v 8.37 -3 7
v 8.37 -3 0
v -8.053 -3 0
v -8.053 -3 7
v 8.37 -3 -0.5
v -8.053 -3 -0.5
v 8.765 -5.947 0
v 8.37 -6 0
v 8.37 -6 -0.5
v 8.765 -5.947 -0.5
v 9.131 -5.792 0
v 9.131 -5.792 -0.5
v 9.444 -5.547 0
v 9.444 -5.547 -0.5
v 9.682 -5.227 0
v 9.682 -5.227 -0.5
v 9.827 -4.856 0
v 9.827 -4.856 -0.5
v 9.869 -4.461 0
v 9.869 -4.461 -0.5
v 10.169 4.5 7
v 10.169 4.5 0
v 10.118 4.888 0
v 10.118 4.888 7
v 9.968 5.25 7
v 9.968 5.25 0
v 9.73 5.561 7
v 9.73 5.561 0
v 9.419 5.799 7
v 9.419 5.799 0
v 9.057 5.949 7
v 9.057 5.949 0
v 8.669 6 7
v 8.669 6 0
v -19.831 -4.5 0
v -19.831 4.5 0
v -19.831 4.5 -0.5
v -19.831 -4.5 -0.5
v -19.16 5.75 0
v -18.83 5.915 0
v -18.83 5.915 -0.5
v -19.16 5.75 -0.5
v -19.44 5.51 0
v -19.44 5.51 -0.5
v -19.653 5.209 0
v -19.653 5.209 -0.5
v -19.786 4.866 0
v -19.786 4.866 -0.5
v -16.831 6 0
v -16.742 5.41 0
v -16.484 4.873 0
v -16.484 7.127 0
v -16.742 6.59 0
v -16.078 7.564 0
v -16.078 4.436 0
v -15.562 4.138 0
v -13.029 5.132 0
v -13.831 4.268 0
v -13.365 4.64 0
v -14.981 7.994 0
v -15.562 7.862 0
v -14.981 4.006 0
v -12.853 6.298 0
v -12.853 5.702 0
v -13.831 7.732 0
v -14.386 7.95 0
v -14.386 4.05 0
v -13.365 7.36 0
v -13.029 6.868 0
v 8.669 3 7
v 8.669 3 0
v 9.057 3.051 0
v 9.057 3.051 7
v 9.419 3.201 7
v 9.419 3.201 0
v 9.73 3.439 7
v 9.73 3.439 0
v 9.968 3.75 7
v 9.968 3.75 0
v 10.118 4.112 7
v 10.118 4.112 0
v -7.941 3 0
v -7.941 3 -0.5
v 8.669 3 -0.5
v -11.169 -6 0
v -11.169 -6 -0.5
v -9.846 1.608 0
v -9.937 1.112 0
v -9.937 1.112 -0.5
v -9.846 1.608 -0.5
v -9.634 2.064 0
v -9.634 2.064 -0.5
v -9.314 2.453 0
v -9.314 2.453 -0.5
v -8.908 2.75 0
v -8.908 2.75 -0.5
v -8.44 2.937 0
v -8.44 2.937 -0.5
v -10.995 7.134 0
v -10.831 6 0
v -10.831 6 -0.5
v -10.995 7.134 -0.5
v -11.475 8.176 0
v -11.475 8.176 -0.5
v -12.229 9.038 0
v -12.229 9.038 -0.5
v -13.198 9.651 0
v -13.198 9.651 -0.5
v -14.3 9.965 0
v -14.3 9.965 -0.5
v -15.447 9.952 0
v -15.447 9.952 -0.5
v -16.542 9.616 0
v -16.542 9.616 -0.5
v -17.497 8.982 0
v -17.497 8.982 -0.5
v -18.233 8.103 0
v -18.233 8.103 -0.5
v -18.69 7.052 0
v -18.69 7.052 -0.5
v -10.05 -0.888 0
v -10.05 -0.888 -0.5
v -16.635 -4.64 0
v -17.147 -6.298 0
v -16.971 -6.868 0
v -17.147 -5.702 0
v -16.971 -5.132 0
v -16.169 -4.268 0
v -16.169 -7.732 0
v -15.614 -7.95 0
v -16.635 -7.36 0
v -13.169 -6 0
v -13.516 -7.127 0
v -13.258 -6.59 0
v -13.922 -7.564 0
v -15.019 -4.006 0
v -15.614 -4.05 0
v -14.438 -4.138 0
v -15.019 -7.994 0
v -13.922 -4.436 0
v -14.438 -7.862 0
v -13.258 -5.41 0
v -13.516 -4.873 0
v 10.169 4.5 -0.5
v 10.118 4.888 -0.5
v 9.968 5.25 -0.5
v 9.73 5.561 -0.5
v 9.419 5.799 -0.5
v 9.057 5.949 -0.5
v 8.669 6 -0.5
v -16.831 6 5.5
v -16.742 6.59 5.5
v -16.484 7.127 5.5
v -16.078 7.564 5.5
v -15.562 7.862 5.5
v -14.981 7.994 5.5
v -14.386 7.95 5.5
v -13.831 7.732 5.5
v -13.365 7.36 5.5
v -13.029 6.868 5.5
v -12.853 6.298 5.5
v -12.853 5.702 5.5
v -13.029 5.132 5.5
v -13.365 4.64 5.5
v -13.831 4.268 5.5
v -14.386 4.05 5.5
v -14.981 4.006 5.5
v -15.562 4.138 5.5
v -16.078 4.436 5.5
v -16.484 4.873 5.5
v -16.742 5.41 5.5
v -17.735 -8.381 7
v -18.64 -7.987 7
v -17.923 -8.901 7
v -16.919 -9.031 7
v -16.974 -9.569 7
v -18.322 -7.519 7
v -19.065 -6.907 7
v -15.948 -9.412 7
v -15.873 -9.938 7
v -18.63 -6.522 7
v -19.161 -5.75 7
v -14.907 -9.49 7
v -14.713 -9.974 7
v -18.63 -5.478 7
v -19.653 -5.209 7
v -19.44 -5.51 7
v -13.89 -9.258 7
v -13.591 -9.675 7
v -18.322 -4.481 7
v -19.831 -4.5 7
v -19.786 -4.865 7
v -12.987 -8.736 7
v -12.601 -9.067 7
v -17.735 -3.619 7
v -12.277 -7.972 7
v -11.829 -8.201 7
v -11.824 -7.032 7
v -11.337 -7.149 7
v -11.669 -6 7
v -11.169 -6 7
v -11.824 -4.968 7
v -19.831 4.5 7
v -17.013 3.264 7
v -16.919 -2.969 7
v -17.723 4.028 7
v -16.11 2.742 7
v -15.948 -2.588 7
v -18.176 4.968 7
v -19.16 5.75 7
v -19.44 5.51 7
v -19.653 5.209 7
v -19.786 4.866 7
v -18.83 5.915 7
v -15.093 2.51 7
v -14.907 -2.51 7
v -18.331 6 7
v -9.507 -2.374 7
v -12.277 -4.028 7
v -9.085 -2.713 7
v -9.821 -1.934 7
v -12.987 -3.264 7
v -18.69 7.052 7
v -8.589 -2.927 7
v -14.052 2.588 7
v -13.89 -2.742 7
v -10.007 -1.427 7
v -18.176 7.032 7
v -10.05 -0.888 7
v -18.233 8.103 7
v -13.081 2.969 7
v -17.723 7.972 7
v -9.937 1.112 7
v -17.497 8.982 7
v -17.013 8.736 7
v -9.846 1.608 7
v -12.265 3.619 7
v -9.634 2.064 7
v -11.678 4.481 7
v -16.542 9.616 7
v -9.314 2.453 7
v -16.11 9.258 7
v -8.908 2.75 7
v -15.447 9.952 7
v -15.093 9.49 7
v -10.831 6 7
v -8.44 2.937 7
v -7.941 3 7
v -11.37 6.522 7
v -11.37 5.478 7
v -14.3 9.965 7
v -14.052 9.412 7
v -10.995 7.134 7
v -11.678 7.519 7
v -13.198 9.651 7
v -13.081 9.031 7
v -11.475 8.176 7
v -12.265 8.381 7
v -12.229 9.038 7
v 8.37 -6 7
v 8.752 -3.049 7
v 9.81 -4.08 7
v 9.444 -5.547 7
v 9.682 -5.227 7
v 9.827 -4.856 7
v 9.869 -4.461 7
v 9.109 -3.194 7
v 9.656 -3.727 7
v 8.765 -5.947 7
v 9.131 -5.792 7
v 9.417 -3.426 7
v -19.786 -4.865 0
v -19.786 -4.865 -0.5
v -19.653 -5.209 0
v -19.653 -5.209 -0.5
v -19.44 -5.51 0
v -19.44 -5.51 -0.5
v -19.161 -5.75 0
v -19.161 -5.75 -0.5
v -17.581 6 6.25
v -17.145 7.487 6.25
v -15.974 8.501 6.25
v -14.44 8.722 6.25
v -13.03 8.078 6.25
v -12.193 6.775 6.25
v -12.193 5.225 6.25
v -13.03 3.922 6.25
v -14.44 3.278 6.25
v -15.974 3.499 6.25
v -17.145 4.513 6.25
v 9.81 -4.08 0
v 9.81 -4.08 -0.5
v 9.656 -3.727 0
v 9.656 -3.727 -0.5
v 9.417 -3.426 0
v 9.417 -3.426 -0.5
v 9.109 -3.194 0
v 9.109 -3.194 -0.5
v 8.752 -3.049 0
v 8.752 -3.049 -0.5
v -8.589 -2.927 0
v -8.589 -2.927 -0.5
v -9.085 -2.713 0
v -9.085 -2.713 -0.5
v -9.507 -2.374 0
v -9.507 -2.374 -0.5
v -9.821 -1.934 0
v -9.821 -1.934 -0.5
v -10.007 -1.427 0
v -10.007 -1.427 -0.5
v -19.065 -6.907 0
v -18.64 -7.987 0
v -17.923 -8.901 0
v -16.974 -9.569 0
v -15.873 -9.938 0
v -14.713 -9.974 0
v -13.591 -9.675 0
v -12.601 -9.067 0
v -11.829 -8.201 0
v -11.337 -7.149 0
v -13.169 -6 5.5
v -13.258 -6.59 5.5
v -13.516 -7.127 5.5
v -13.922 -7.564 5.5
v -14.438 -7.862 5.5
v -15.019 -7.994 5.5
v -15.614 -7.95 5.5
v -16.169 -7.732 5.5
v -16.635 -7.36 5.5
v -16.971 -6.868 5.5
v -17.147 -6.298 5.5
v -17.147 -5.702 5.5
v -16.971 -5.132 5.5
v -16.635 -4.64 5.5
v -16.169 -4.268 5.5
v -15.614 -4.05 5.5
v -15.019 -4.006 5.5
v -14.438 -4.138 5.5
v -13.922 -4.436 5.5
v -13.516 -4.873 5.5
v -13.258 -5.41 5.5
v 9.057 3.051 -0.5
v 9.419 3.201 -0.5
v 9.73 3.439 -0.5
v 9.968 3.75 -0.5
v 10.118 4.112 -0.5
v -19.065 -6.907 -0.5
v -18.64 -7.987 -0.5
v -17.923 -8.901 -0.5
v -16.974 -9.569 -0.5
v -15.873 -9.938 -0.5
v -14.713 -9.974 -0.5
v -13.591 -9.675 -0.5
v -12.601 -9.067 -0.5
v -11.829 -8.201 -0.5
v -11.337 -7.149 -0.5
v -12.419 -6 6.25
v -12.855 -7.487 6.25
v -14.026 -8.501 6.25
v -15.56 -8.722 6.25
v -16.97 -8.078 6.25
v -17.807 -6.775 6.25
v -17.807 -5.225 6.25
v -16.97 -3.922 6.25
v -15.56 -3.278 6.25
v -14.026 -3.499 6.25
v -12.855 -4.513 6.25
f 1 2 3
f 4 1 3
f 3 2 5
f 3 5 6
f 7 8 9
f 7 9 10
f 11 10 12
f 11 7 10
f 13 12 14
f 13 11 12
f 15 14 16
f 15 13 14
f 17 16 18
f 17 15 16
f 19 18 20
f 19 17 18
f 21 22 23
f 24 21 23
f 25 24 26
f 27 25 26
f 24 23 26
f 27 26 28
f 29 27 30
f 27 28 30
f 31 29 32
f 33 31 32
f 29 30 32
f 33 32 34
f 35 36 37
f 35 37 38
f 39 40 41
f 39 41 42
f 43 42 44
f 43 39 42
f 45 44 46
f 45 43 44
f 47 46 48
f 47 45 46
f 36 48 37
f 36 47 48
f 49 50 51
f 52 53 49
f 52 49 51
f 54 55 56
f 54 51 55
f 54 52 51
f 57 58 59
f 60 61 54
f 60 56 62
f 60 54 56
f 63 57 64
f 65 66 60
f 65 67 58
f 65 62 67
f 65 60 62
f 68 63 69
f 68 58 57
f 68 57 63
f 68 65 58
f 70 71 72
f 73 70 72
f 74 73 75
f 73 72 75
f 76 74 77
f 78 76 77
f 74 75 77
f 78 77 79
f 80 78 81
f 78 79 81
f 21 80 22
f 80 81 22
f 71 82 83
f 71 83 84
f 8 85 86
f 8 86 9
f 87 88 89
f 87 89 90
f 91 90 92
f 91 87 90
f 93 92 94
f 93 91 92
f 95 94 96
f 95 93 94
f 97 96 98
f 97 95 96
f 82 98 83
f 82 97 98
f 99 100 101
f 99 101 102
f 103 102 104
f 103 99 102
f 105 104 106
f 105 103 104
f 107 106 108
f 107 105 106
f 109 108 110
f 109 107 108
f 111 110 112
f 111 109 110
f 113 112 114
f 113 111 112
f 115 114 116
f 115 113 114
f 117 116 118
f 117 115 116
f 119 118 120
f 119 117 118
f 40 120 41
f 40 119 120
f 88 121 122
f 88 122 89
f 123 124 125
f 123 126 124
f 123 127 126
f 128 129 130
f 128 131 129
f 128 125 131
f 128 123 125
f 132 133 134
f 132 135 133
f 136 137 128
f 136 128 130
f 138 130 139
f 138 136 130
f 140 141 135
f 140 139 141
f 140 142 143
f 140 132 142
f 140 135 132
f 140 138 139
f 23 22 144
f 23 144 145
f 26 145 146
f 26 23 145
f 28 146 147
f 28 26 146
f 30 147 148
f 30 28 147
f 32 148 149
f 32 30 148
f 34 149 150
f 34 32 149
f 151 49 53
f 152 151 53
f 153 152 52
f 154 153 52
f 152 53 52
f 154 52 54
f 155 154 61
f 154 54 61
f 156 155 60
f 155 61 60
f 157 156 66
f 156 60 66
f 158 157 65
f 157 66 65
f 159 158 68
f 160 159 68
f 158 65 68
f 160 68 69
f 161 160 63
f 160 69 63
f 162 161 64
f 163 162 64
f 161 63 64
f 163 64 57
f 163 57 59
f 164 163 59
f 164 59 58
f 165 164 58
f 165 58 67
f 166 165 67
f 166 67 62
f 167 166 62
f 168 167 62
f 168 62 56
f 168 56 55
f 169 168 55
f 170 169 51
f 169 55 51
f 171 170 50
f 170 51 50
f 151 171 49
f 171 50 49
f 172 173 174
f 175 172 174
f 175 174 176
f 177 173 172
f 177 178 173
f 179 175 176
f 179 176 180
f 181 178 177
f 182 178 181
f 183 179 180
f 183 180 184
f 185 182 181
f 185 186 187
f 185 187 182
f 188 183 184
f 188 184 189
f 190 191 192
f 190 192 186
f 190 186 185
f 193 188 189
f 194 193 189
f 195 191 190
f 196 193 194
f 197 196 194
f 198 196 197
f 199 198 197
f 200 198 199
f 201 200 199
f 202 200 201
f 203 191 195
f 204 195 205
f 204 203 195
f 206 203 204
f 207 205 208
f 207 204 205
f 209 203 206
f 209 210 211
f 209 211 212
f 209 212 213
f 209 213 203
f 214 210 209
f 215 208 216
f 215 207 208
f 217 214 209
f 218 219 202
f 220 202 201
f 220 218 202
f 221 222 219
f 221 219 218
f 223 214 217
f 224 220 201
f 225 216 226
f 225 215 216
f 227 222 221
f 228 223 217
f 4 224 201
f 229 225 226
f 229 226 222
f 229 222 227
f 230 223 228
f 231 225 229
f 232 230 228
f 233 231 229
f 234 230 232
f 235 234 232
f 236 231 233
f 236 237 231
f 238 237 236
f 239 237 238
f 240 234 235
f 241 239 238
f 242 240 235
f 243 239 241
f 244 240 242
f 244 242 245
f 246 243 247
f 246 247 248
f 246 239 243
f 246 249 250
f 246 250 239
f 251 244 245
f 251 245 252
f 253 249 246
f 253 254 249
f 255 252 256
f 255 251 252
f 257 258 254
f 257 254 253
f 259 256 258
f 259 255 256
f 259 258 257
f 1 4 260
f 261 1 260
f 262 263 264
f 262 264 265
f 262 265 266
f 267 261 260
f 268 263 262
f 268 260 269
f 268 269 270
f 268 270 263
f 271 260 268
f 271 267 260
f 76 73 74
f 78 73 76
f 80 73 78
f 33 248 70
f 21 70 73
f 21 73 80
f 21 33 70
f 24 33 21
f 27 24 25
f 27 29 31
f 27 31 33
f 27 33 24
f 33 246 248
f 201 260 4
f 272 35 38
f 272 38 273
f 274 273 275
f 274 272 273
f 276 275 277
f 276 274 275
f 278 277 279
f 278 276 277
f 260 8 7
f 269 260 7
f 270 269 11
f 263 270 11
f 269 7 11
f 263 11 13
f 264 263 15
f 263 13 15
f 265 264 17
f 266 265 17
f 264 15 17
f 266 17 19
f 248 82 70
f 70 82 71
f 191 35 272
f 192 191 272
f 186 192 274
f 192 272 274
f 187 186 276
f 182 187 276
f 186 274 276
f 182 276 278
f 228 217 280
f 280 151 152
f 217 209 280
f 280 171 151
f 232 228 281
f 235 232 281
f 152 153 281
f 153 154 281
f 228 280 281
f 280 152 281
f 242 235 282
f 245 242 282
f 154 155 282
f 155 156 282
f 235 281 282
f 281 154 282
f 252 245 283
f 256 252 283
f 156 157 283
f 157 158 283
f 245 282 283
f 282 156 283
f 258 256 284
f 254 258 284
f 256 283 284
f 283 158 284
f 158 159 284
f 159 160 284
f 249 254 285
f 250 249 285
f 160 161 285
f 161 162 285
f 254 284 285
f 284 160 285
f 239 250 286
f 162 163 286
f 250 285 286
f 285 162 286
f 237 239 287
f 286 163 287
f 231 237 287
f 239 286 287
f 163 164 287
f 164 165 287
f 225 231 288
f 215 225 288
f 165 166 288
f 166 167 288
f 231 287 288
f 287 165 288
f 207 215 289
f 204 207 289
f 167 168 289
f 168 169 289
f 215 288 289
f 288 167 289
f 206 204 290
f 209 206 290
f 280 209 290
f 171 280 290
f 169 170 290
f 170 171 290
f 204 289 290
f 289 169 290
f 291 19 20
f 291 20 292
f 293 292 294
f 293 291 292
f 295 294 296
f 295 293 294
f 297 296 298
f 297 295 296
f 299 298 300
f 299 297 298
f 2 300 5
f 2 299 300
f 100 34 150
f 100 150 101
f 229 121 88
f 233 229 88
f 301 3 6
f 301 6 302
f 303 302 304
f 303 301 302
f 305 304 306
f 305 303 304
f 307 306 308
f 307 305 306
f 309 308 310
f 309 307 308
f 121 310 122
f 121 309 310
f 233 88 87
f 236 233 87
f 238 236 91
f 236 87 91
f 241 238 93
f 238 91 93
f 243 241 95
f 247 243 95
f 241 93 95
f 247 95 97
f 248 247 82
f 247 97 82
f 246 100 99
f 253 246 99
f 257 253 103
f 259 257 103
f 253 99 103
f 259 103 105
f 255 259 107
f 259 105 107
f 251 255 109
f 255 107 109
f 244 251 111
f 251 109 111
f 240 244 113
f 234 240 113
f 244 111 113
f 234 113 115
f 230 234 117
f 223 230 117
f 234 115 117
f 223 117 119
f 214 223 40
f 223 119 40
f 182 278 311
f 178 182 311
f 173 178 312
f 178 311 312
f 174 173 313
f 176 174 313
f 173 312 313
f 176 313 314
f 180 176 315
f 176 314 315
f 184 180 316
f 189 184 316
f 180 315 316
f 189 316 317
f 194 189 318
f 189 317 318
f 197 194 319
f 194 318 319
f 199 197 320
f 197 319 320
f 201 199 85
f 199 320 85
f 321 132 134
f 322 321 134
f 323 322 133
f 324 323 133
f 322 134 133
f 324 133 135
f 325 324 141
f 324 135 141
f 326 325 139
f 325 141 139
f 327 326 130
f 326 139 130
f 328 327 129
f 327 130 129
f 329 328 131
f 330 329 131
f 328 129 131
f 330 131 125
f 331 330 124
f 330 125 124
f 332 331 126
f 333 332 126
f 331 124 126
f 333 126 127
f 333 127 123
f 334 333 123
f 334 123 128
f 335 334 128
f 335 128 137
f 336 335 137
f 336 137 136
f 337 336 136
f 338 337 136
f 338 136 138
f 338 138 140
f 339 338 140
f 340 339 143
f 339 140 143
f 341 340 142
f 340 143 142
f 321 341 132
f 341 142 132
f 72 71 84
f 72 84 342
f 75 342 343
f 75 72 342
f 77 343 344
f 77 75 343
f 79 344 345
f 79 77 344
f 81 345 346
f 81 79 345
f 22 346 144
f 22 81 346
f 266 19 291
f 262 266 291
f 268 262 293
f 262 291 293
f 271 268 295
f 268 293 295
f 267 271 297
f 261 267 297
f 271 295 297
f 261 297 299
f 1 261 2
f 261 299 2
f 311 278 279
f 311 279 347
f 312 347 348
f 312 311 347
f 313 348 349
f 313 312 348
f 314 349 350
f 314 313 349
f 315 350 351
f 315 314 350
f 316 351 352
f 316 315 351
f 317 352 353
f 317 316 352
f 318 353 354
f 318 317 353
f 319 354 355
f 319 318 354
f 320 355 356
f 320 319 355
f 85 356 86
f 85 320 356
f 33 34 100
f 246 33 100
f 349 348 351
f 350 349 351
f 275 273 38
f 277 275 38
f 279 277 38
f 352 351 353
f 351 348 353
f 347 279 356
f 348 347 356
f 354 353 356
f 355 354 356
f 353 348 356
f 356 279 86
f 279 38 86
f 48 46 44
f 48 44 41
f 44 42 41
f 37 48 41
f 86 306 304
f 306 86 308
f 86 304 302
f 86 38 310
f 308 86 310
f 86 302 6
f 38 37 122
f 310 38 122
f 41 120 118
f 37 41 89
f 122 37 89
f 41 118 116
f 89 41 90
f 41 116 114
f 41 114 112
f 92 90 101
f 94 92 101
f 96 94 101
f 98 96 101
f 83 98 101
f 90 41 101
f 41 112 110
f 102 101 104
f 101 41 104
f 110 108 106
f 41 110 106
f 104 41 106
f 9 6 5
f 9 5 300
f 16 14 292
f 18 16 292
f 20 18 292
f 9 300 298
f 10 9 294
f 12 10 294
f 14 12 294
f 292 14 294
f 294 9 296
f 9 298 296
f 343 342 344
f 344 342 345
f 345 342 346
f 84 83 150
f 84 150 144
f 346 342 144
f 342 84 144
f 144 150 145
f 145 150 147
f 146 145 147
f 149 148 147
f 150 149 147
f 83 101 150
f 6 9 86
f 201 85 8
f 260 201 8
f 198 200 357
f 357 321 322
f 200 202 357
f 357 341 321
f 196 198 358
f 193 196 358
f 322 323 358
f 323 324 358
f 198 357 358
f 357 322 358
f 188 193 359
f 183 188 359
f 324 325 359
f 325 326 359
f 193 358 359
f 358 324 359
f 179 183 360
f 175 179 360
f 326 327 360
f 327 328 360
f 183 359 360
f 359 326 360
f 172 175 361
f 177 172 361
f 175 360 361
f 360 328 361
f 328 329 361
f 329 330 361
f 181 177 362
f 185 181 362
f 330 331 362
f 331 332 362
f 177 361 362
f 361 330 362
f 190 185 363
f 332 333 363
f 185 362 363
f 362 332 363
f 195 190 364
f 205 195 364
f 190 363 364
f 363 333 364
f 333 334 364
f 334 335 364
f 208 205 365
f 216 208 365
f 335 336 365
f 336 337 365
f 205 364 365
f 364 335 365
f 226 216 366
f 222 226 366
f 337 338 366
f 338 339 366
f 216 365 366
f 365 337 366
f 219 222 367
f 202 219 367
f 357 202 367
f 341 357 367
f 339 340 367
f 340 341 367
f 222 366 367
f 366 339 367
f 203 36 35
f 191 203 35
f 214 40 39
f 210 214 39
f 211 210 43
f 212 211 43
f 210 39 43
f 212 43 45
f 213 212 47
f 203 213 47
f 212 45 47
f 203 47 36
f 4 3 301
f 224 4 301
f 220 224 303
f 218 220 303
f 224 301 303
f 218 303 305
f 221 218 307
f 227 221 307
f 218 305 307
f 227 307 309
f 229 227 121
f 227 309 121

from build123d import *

# Parameters (mm, degrees)
F1_DEPTH = 7
F2_DEPTH = 0.5
F3_SIZE  = 1.5


with BuildPart() as f1:
    # F0 (on Top) → F1 (new body)
    with BuildSketch(Plane.XY):
        with BuildLine():
            ThreePointArc((9.8694702636, -4.4606494482), (9.4166416974, -3.4255173739), (8.3699865077, -3))
            Line((8.3699865077, -3), (-8.0531213294, -3))
            ThreePointArc((-8.0531213294, -3), (-9.5065298079, -2.3739009406), (-10.0499606051, -0.8876037946))
            Line((-10.0499606051, -0.8876037946), (-9.9373864918, 1.1123962054))
            ThreePointArc((-9.9373864918, 1.1123962054), (-9.3144481567, 2.4534084785), (-7.9405472161, 3))
            Line((-7.9405472161, 3), (8.6688611699, 3))
            ThreePointArc((8.6688611699, 3), (9.7295213417, 3.4393398282), (10.1688611699, 4.5))
            ThreePointArc((10.1688611699, 4.5), (9.7295213417, 5.5606601718), (8.6688611699, 6))
            Line((8.6688611699, 6), (-10.8311388301, 6))
            ThreePointArc((-10.8311388301, 6), (-14.788404424, 2.0002282852), (-18.8302257154, 5.9145360656))
            ThreePointArc((-18.8302257154, 5.9145360656), (-19.5556040864, 5.3664207038), (-19.8311388301, 4.5))
            Line((-19.8311388301, 4.5), (-19.8311388301, -4.5))
            ThreePointArc((-19.8311388301, -4.5), (-19.6530330387, -5.2089398432), (-19.1610112284, -5.7495246306))
            ThreePointArc((-19.1610112284, -5.7495246306), (-15.0435619957, -2.001962967), (-11.1688611699, -6))
            Line((-11.1688611699, -6), (8.3699865077, -6))
            ThreePointArc((8.3699865077, -6), (9.4444691339, -5.5466551897), (9.8694702636, -4.4606494482))
        make_face()
        with BuildLine():
            ThreePointArc((-19.1610112284, -5.7495246306), (-15.2941603441, -9.998037033), (-11.1688611699, -6))
            Line((-11.1688611699, -6), (-13.1688611699, -6))
            ThreePointArc((-13.1688611699, -6), (-15.1688611699, -8), (-17.1688611699, -6))
            Line((-17.1688611699, -6), (-18.3311388301, -6))
            ThreePointArc((-18.3311388301, -6), (-18.7645630184, -5.9360165295), (-19.1610112284, -5.7495246306))
        make_face()
        with BuildLine():
            Line((-13.1688611699, -6), (-11.1688611699, -6))
            ThreePointArc((-11.1688611699, -6), (-15.0435619957, -2.001962967), (-19.1610112284, -5.7495246306))
            ThreePointArc((-19.1610112284, -5.7495246306), (-18.7645630184, -5.9360165295), (-18.3311388301, -6))
            Line((-18.3311388301, -6), (-17.1688611699, -6))
            ThreePointArc((-17.1688611699, -6), (-15.1688611699, -4), (-13.1688611699, -6))
        make_face()
        with BuildLine():
            ThreePointArc((-10.8311388301, 6), (-14.8738732362, 9.9997717148), (-18.8302257154, 5.9145360656))
            ThreePointArc((-18.8302257154, 5.9145360656), (-18.5843145611, 5.9784796411), (-18.3311388301, 6))
            Line((-18.3311388301, 6), (-16.8311388301, 6))
            ThreePointArc((-16.8311388301, 6), (-14.8311388301, 8), (-12.8311388301, 6))
            Line((-12.8311388301, 6), (-10.8311388301, 6))
        make_face()
        with BuildLine():
            ThreePointArc((-18.3311388301, 6), (-18.5843145611, 5.9784796411), (-18.8302257154, 5.9145360656))
            ThreePointArc((-18.8302257154, 5.9145360656), (-14.788404424, 2.0002282852), (-10.8311388301, 6))
            Line((-10.8311388301, 6), (-12.8311388301, 6))
            ThreePointArc((-12.8311388301, 6), (-14.8311388301, 4), (-16.8311388301, 6))
            Line((-16.8311388301, 6), (-18.3311388301, 6))
        make_face()
    extrude(amount=F1_DEPTH)

    # F0 (on Top) → F2 (join)
    with BuildSketch(Plane.XY):
        with BuildLine():
            ThreePointArc((9.8694702636, -4.4606494482), (9.4166416974, -3.4255173739), (8.3699865077, -3))
            Line((8.3699865077, -3), (-8.0531213294, -3))
            ThreePointArc((-8.0531213294, -3), (-9.5065298079, -2.3739009406), (-10.0499606051, -0.8876037946))
            Line((-10.0499606051, -0.8876037946), (-9.9373864918, 1.1123962054))
            ThreePointArc((-9.9373864918, 1.1123962054), (-9.3144481567, 2.4534084785), (-7.9405472161, 3))
            Line((-7.9405472161, 3), (8.6688611699, 3))
            ThreePointArc((8.6688611699, 3), (9.7295213417, 3.4393398282), (10.1688611699, 4.5))
            ThreePointArc((10.1688611699, 4.5), (9.7295213417, 5.5606601718), (8.6688611699, 6))
            Line((8.6688611699, 6), (-10.8311388301, 6))
            ThreePointArc((-10.8311388301, 6), (-14.788404424, 2.0002282852), (-18.8302257154, 5.9145360656))
            ThreePointArc((-18.8302257154, 5.9145360656), (-19.5556040864, 5.3664207038), (-19.8311388301, 4.5))
            Line((-19.8311388301, 4.5), (-19.8311388301, -4.5))
            ThreePointArc((-19.8311388301, -4.5), (-19.6530330387, -5.2089398432), (-19.1610112284, -5.7495246306))
            ThreePointArc((-19.1610112284, -5.7495246306), (-15.0435619957, -2.001962967), (-11.1688611699, -6))
            Line((-11.1688611699, -6), (8.3699865077, -6))
            ThreePointArc((8.3699865077, -6), (9.4444691339, -5.5466551897), (9.8694702636, -4.4606494482))
        make_face()
        with BuildLine():
            ThreePointArc((-19.1610112284, -5.7495246306), (-15.2941603441, -9.998037033), (-11.1688611699, -6))
            Line((-11.1688611699, -6), (-13.1688611699, -6))
            ThreePointArc((-13.1688611699, -6), (-15.1688611699, -8), (-17.1688611699, -6))
            Line((-17.1688611699, -6), (-18.3311388301, -6))
            ThreePointArc((-18.3311388301, -6), (-18.7645630184, -5.9360165295), (-19.1610112284, -5.7495246306))
        make_face()
        with BuildLine():
            Line((-13.1688611699, -6), (-11.1688611699, -6))
            ThreePointArc((-11.1688611699, -6), (-15.0435619957, -2.001962967), (-19.1610112284, -5.7495246306))
            ThreePointArc((-19.1610112284, -5.7495246306), (-18.7645630184, -5.9360165295), (-18.3311388301, -6))
            Line((-18.3311388301, -6), (-17.1688611699, -6))
            ThreePointArc((-17.1688611699, -6), (-15.1688611699, -4), (-13.1688611699, -6))
        make_face()
        with BuildLine():
            ThreePointArc((-10.8311388301, 6), (-14.8738732362, 9.9997717148), (-18.8302257154, 5.9145360656))
            ThreePointArc((-18.8302257154, 5.9145360656), (-18.5843145611, 5.9784796411), (-18.3311388301, 6))
            Line((-18.3311388301, 6), (-16.8311388301, 6))
            ThreePointArc((-16.8311388301, 6), (-14.8311388301, 8), (-12.8311388301, 6))
            Line((-12.8311388301, 6), (-10.8311388301, 6))
        make_face()
        with BuildLine():
            ThreePointArc((-18.3311388301, 6), (-18.5843145611, 5.9784796411), (-18.8302257154, 5.9145360656))
            ThreePointArc((-18.8302257154, 5.9145360656), (-14.788404424, 2.0002282852), (-10.8311388301, 6))
            Line((-10.8311388301, 6), (-12.8311388301, 6))
            ThreePointArc((-12.8311388301, 6), (-14.8311388301, 4), (-16.8311388301, 6))
            Line((-16.8311388301, 6), (-18.3311388301, 6))
        make_face()
        with BuildLine():
            Line((-16.8311388301, 6), (-12.8311388301, 6))
            ThreePointArc((-12.8311388301, 6), (-14.8311388301, 8), (-16.8311388301, 6))
        make_face()
        with BuildLine():
            ThreePointArc((-16.8311388301, 6), (-14.8311388301, 4), (-12.8311388301, 6))
            Line((-12.8311388301, 6), (-16.8311388301, 6))
        make_face()
        with BuildLine():
            Line((-17.1688611699, -6), (-13.1688611699, -6))
            ThreePointArc((-13.1688611699, -6), (-15.1688611699, -4), (-17.1688611699, -6))
        make_face()
        with BuildLine():
            ThreePointArc((-17.1688611699, -6), (-15.1688611699, -8), (-13.1688611699, -6))
            Line((-13.1688611699, -6), (-17.1688611699, -6))
        make_face()
    extrude(amount=-F2_DEPTH)

    # F3
    f3_edges = [f1.edges().sort_by_distance(p)[0] for p in [
        (-12.831139, 6, 7),
        (-17.168861, -6, 7),
    ]]
    chamfer(f3_edges, length=F3_SIZE)


solid = f1.part
